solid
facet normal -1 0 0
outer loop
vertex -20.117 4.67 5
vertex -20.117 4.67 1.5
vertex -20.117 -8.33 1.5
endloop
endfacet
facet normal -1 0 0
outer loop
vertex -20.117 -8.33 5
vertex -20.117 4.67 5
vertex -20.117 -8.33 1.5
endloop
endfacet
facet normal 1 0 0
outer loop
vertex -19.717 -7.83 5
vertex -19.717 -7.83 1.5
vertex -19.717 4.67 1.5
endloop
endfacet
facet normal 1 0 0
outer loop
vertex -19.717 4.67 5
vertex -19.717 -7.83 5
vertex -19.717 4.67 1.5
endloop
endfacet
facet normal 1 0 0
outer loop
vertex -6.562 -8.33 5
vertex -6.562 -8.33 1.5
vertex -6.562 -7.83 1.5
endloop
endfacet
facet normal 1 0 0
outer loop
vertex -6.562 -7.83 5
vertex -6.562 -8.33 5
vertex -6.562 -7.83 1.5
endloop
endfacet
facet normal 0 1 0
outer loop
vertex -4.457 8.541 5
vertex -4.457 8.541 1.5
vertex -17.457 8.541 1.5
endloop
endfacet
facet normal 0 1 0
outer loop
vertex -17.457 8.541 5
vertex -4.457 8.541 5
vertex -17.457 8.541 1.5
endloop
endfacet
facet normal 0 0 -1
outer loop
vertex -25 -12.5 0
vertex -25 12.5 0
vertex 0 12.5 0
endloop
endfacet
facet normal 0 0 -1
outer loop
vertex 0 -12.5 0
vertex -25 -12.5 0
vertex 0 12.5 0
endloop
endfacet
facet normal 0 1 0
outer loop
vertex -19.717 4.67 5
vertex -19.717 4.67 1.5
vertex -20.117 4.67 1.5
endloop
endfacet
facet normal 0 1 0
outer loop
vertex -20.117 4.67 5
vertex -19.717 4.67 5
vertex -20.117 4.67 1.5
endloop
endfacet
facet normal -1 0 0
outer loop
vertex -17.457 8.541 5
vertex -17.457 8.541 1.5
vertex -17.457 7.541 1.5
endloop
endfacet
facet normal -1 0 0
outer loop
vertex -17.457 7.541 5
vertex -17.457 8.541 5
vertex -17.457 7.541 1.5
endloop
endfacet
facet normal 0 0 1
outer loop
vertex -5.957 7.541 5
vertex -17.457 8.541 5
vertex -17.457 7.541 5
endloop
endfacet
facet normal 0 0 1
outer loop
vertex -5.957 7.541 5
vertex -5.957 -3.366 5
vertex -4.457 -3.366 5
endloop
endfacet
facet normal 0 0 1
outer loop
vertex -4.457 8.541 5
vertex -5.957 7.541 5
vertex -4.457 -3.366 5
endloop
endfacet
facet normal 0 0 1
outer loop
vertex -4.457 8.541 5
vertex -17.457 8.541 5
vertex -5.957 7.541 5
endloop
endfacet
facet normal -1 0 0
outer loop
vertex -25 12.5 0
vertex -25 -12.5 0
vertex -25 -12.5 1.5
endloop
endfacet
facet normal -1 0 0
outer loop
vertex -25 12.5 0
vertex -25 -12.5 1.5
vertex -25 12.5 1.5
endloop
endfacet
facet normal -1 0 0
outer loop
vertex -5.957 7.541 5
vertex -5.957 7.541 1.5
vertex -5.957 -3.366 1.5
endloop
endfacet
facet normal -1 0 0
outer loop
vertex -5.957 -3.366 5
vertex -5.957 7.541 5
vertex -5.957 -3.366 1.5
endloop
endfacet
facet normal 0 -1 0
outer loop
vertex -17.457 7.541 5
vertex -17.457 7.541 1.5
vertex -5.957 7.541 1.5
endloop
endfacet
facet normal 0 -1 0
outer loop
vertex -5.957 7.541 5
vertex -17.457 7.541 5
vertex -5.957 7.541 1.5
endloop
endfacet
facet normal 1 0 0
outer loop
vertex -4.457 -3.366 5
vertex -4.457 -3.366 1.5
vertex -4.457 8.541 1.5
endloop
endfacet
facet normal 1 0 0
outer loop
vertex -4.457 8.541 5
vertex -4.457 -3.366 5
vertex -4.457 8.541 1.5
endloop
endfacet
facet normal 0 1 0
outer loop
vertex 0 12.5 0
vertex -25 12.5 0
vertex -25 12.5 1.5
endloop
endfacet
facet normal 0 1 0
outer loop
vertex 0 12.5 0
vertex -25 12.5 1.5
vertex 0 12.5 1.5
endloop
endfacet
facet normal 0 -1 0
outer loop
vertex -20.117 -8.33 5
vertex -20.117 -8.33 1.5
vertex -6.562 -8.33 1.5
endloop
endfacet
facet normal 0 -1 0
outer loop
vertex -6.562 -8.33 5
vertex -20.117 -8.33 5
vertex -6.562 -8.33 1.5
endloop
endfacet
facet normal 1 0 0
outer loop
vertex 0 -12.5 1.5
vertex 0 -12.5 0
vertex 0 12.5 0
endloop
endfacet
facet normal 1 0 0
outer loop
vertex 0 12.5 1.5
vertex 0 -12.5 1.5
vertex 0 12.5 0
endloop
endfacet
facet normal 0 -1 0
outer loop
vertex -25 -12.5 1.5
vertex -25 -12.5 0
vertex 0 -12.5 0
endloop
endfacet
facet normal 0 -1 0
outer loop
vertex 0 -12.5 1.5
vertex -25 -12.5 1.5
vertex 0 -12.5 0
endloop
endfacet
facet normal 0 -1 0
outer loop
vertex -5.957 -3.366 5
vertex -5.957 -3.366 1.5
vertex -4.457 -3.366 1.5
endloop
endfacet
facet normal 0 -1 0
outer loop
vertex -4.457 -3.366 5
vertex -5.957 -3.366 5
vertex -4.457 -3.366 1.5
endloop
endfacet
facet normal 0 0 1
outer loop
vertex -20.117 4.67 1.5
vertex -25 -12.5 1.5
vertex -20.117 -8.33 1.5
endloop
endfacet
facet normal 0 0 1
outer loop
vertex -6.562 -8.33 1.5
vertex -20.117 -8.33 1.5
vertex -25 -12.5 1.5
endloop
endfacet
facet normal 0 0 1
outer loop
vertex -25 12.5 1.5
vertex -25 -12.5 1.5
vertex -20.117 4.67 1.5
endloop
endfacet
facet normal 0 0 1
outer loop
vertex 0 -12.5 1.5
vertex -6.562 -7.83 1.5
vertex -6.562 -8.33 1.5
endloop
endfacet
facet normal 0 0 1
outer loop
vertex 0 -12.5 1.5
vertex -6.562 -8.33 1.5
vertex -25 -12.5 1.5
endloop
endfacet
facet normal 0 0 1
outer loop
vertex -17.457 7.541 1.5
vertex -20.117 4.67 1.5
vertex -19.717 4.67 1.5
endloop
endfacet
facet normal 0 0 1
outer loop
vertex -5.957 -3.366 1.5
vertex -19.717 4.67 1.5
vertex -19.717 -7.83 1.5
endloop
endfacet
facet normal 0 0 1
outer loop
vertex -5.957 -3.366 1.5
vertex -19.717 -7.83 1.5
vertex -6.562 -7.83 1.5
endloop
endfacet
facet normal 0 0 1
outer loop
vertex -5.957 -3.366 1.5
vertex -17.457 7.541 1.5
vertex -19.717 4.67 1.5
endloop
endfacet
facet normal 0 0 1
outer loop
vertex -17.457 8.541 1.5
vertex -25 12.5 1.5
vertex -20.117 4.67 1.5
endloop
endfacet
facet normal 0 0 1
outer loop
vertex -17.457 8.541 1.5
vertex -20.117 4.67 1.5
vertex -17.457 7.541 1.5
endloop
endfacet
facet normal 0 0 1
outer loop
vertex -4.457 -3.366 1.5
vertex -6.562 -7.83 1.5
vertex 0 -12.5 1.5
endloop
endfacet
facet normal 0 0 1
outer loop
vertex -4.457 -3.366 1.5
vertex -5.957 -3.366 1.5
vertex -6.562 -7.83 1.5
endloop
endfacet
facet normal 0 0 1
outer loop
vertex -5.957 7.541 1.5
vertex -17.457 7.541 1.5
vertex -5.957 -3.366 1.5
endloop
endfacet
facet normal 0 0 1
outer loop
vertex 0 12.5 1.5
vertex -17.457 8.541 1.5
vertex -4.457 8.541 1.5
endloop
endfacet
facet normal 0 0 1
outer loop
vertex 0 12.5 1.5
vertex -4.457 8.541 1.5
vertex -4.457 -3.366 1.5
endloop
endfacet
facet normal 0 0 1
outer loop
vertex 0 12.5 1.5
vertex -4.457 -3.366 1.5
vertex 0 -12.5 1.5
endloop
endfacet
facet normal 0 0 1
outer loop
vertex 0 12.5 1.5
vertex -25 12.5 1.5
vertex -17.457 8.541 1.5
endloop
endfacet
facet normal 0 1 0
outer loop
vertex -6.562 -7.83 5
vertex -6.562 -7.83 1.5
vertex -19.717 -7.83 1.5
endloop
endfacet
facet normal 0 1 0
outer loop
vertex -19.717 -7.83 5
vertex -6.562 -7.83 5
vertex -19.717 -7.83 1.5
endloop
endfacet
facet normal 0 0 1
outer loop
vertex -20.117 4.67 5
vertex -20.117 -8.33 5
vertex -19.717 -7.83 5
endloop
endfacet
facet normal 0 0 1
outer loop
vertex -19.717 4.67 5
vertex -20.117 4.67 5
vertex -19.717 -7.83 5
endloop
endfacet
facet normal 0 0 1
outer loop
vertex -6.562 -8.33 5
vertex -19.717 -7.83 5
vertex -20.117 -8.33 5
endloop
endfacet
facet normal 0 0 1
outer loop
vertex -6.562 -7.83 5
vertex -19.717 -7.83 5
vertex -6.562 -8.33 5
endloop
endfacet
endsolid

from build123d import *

# Parameters (mm, degrees)
F1_DEPTH = 5
F0_W     = 25
F0_H     = 25
F2_DEPTH = 1.5
F3_DEPTH = 5


with BuildPart() as f1:
    # F0 (on Top) → F1 (new body)
    with BuildSketch(Plane.XY):
        Polygon((-4.457476, 8.541189), (-17.457476, 8.541189), (-17.457476, 7.541189), (-5.957476, 7.541189), (-5.957476, -3.366469), (-4.457476, -3.366469), align=None)
    extrude(amount=F1_DEPTH)

    # F0 (on Top) → F2 (join)
    with BuildSketch(Plane.XY):
        with Locations((-12.5, 0)):
            Rectangle(F0_W, F0_H)
        Polygon((-20.116894, 4.669981), (-19.716894, 4.669981), (-19.716894, -7.830019), (-6.561746, -7.830019), (-6.561746, -8.330019), (-20.116894, -8.330019), align=None, mode=Mode.SUBTRACT)
        Polygon((-17.457476, 7.541189), (-17.457476, 8.541189), (-4.457476, 8.541189), (-4.457476, -3.366469), (-5.957476, -3.366469), (-5.957476, 7.541189), align=None, mode=Mode.SUBTRACT)
    extrude(amount=F2_DEPTH)

    # F0 (on Top) → F3 (join)
    with BuildSketch(Plane.XY):
        Polygon((-19.716894, -7.830019), (-19.716894, 4.669981), (-20.116894, 4.669981), (-20.116894, -8.330019), (-6.561746, -8.330019), (-6.561746, -7.830019), align=None)
    extrude(amount=F3_DEPTH)


solid = f1.part
